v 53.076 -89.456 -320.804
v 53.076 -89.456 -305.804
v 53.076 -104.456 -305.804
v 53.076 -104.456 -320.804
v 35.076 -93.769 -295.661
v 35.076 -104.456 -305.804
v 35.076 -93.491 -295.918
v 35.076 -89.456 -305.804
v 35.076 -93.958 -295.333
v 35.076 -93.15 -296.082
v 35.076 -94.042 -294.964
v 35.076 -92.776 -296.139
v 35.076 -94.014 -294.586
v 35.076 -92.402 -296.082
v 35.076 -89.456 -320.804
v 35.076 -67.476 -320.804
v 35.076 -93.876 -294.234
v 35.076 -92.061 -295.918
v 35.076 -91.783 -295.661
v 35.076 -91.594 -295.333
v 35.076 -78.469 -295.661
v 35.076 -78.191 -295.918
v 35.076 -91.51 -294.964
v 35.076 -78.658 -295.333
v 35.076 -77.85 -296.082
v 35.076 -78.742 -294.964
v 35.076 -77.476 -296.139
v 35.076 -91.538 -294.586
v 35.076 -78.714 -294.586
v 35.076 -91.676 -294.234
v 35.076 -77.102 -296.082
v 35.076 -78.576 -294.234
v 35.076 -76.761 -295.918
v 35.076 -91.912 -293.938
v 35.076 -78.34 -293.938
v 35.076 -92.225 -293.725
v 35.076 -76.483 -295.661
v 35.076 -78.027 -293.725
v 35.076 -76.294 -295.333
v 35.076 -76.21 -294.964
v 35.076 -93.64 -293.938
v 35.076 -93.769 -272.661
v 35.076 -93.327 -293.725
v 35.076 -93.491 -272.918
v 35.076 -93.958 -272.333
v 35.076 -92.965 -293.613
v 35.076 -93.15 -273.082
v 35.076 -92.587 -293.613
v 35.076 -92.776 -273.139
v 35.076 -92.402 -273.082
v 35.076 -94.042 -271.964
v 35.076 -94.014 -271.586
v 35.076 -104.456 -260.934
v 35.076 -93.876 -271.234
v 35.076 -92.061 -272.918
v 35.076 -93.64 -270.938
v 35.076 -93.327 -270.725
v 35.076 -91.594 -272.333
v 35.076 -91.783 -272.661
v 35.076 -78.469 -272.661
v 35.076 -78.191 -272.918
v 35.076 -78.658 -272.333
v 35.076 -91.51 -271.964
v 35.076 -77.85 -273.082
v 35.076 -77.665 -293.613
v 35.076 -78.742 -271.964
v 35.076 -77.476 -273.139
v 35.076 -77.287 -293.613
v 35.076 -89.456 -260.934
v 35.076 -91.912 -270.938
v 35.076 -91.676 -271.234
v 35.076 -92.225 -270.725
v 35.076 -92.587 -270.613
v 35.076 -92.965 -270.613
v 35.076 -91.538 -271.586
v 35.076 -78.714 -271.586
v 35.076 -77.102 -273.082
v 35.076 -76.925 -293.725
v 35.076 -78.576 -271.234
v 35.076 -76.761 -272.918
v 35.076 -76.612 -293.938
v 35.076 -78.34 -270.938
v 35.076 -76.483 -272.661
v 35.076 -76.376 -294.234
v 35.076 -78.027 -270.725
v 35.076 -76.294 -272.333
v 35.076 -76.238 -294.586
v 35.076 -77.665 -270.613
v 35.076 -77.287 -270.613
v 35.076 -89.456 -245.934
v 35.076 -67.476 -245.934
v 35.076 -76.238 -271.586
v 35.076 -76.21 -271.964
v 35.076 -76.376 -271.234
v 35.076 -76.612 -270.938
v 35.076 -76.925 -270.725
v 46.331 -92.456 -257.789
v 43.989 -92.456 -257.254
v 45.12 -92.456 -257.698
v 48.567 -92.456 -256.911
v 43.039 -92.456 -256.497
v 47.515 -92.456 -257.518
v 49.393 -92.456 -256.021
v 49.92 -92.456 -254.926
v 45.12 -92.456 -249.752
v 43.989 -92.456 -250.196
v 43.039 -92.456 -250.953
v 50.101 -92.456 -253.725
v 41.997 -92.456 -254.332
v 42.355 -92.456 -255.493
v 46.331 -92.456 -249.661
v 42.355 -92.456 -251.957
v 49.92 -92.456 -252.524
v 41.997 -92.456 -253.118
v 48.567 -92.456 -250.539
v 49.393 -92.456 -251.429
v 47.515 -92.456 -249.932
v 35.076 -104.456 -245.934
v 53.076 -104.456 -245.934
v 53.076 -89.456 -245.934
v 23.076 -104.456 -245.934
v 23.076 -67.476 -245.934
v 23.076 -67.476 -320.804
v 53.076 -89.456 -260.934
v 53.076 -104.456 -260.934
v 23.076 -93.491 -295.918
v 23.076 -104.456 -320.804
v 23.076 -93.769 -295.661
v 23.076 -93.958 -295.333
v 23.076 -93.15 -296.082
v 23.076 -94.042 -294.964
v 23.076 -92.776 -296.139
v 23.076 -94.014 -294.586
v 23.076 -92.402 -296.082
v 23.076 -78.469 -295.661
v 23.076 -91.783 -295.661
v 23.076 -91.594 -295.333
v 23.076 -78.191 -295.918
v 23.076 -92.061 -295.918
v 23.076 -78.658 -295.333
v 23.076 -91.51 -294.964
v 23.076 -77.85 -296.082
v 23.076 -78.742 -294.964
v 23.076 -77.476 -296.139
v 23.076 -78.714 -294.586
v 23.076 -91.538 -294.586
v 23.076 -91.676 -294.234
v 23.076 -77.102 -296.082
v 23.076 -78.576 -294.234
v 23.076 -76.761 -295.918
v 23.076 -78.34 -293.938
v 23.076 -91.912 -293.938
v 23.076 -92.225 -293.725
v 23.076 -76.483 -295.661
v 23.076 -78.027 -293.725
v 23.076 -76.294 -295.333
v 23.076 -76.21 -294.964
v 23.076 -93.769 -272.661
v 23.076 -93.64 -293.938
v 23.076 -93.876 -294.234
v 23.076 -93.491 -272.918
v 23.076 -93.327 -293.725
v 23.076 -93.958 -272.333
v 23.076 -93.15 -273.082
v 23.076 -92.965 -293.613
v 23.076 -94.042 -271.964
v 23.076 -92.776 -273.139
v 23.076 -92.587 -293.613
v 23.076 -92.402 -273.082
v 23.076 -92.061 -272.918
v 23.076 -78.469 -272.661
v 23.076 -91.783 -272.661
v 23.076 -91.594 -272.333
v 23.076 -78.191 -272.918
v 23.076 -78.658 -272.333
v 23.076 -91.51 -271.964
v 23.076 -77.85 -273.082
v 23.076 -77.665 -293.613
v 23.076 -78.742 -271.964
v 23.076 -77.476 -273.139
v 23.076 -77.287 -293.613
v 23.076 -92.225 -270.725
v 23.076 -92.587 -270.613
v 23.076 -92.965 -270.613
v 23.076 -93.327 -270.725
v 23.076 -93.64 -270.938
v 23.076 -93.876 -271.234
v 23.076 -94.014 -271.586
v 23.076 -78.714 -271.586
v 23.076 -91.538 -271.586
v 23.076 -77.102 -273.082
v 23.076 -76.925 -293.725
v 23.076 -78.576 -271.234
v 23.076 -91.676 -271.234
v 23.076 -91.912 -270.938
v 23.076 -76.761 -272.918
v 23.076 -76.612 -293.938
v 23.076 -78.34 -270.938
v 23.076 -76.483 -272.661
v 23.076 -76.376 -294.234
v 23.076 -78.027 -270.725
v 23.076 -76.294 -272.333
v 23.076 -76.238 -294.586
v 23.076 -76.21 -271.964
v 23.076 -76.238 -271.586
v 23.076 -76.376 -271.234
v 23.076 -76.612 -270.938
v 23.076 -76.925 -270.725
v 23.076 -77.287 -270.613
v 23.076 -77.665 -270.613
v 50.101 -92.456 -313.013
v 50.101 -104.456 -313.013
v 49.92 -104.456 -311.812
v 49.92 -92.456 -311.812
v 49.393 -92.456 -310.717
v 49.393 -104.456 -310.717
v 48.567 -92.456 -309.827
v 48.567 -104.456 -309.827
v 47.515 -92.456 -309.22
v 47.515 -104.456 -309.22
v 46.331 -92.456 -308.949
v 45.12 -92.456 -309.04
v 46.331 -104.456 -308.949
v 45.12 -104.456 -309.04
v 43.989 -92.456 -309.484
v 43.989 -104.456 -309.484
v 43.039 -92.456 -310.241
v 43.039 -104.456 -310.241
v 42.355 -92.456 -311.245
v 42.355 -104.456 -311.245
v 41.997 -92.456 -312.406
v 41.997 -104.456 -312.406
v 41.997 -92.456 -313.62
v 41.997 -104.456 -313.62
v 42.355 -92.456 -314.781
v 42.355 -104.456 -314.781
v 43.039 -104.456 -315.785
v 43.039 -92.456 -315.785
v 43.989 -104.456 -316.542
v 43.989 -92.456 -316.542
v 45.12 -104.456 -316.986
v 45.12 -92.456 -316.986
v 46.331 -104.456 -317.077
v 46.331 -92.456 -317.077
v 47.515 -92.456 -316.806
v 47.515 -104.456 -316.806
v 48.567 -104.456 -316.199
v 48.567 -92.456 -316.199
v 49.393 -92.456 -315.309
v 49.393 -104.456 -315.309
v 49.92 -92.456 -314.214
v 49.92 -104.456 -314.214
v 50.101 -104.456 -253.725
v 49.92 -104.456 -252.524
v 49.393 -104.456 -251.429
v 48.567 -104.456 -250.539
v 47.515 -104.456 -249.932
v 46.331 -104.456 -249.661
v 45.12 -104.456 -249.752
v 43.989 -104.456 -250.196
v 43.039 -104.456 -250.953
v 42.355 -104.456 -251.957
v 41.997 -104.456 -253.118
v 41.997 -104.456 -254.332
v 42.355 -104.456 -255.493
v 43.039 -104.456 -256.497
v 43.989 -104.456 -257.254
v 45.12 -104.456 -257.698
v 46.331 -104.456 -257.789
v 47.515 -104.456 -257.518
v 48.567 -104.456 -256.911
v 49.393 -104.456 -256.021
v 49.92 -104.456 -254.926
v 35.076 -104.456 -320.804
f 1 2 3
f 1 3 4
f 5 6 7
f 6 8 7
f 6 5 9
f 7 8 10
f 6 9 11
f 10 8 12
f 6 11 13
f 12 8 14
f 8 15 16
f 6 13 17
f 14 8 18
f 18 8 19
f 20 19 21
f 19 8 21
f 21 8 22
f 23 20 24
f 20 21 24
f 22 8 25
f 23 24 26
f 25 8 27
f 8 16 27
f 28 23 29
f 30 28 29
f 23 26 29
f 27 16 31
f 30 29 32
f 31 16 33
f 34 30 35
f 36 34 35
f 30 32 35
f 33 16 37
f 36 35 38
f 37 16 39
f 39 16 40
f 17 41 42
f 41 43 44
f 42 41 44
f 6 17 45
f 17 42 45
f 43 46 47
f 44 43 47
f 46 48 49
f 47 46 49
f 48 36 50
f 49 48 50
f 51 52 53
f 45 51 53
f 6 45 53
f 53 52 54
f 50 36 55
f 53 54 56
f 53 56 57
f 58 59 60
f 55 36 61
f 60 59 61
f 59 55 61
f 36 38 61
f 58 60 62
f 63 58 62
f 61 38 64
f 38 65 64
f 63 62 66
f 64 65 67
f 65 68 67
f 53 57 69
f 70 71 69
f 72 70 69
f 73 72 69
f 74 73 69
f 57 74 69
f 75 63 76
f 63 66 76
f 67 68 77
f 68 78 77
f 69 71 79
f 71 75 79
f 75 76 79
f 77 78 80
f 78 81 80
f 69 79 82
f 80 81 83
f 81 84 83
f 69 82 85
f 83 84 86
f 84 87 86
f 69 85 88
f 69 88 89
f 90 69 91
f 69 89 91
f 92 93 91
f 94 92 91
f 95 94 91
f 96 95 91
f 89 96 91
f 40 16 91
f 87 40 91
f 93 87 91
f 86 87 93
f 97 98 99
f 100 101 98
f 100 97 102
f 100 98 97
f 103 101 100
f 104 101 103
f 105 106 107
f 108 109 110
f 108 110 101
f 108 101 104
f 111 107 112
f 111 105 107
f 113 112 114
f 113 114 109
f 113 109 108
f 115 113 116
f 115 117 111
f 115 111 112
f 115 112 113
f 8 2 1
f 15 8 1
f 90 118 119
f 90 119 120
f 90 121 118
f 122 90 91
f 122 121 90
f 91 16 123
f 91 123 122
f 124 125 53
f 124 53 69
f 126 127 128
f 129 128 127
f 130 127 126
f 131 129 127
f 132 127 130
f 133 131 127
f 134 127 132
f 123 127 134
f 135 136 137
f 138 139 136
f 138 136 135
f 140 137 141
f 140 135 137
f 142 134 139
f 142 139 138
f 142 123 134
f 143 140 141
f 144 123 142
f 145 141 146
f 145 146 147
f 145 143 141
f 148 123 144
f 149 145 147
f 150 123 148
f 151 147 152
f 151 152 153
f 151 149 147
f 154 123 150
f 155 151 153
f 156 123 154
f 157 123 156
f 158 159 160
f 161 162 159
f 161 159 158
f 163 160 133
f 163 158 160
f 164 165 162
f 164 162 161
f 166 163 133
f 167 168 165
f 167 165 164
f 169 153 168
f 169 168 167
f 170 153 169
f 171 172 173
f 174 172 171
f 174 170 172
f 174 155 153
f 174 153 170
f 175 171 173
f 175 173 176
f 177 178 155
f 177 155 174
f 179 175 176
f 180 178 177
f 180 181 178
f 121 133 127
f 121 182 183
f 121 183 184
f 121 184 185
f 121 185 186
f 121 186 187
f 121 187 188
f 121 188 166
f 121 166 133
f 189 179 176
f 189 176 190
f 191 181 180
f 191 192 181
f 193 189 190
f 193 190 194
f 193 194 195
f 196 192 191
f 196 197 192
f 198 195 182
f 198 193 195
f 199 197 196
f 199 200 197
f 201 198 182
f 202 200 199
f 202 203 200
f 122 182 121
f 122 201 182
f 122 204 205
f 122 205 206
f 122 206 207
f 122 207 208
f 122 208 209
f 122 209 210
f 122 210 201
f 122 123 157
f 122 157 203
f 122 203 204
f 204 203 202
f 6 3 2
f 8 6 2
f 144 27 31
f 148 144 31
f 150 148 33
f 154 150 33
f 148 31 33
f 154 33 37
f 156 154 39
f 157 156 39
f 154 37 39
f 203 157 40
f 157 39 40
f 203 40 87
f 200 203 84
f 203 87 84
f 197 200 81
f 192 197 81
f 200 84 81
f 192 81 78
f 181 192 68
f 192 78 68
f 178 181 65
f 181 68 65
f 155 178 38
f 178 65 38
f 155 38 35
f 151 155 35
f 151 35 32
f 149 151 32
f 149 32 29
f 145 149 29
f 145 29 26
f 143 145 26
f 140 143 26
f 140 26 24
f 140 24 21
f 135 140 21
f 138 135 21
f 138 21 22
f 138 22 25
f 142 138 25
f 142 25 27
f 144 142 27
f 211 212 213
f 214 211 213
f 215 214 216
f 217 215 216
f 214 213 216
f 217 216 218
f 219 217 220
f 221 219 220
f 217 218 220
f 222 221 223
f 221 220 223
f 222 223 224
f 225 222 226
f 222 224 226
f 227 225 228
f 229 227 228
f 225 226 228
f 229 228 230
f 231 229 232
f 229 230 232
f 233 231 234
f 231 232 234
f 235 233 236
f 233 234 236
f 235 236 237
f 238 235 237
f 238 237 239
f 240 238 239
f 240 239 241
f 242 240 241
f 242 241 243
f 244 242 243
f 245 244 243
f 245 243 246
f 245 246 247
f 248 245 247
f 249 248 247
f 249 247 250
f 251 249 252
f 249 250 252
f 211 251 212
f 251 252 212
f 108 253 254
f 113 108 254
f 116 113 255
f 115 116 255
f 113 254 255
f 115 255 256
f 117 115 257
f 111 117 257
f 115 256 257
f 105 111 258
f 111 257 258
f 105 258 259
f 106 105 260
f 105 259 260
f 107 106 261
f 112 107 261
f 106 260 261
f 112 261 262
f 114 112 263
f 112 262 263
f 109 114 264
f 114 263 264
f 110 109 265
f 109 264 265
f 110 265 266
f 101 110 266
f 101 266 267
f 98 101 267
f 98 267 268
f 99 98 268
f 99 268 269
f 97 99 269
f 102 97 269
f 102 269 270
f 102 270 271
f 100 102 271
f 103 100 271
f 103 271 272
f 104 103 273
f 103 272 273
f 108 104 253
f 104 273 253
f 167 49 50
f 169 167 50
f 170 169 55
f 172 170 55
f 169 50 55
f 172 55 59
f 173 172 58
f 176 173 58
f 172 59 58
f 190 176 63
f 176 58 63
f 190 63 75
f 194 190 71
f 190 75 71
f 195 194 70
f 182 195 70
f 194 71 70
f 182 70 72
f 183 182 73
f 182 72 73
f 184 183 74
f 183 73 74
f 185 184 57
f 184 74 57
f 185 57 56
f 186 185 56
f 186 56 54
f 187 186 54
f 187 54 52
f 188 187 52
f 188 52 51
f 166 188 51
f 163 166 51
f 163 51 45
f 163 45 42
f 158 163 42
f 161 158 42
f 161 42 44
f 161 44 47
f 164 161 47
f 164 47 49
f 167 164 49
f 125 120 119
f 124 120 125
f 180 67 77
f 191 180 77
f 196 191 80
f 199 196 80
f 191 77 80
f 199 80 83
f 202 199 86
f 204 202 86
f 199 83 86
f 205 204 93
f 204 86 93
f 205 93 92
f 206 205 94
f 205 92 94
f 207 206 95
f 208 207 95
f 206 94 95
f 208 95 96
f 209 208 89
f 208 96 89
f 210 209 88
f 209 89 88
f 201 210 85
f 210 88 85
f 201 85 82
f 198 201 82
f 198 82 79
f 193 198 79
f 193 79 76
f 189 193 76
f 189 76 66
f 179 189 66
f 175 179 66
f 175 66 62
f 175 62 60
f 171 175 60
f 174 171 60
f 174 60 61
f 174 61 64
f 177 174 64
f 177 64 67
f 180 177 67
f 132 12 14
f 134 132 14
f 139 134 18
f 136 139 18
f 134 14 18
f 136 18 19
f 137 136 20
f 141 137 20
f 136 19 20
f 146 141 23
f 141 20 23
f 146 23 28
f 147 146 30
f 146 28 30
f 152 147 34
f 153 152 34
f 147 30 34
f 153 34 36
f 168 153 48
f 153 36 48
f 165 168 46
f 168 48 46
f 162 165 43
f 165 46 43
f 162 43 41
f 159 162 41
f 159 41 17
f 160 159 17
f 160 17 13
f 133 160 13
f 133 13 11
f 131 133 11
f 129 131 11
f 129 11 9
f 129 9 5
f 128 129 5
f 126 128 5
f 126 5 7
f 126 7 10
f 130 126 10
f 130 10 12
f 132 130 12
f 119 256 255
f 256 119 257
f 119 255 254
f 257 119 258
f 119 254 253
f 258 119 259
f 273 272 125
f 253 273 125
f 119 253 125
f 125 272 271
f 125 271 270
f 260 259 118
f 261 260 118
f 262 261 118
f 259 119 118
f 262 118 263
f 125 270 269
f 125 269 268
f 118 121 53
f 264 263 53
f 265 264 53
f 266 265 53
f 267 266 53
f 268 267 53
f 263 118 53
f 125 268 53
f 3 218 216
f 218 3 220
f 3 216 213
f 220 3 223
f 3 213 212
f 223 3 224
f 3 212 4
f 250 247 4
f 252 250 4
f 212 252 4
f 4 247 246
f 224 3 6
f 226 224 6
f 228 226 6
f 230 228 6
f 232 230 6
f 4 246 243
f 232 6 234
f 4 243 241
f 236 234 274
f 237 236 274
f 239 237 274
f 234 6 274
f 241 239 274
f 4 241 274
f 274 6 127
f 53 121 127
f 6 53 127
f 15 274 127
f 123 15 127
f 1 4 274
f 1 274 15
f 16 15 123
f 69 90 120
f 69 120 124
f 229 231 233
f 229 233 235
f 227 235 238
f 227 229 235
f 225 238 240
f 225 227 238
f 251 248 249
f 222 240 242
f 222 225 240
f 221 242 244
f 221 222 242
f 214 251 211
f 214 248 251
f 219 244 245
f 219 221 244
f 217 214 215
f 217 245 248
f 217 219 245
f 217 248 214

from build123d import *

# Parameters (mm, degrees)
SKETCH1_W           = 74.870479659
SKETCH1_H           = 36.98000569
BOSS_EXTRUDE1_DEPTH = 12
SKETCH4_W           = 15
SKETCH4_H           = 15
BOSS_EXTRUDE3_DEPTH = 18
SKETCH5_R           = 4.075
CUT_EXTRUDE1_DEPTH  = 12
SKETCH3_R           = 1.27
CUT_EXTRUDE3_DEPTH  = 13


with BuildPart() as part:
    # Sketch1 → Boss-Extrude1 (new body)
    with BuildSketch(Plane.ZY.offset(-35.076450848)):
        with Locations((-283.368991002, -85.966002845)):
            Rectangle(SKETCH1_W, SKETCH1_H)
    extrude(amount=BOSS_EXTRUDE1_DEPTH)

    # Sketch4 → Boss-Extrude3 (add)
    with BuildSketch(Plane(origin=(35.076450848, 0, 0), x_dir=(0, 0, -1), z_dir=(1, 0, 0))):
        with Locations((253.433751172, -96.95600569)):
            Rectangle(SKETCH4_W, SKETCH4_H)
        with Locations((313.304230831, -96.95600569)):
            Rectangle(SKETCH4_W, SKETCH4_H)
    extrude(amount=BOSS_EXTRUDE3_DEPTH)

    # Sketch5 → Cut-Extrude1 (cut)
    with BuildSketch(Plane.XZ.offset(104.45600569)):
        with Locations((46.026450848, -253.725)):
            Circle(SKETCH5_R)
        with Locations((46.026450848, -313.012982003)):
            Circle(SKETCH5_R)
    extrude(amount=-CUT_EXTRUDE1_DEPTH, mode=Mode.SUBTRACT)

    # Sketch3 → Cut-Extrude3 (cut, through all)
    with BuildSketch(Plane(origin=(35.076450848, 0, 0), x_dir=(0, 0, -1), z_dir=(1, 0, 0))):
        with Locations((271.868893694, -77.476)):
            Circle(SKETCH3_R)
        with Locations((271.868893694, -92.776)):
            Circle(SKETCH3_R)
        with Locations((294.868893694, -77.476)):
            Circle(SKETCH3_R)
        with Locations((294.868893694, -92.776)):
            Circle(SKETCH3_R)
    extrude(amount=-CUT_EXTRUDE3_DEPTH, mode=Mode.SUBTRACT)


solid = part.part
